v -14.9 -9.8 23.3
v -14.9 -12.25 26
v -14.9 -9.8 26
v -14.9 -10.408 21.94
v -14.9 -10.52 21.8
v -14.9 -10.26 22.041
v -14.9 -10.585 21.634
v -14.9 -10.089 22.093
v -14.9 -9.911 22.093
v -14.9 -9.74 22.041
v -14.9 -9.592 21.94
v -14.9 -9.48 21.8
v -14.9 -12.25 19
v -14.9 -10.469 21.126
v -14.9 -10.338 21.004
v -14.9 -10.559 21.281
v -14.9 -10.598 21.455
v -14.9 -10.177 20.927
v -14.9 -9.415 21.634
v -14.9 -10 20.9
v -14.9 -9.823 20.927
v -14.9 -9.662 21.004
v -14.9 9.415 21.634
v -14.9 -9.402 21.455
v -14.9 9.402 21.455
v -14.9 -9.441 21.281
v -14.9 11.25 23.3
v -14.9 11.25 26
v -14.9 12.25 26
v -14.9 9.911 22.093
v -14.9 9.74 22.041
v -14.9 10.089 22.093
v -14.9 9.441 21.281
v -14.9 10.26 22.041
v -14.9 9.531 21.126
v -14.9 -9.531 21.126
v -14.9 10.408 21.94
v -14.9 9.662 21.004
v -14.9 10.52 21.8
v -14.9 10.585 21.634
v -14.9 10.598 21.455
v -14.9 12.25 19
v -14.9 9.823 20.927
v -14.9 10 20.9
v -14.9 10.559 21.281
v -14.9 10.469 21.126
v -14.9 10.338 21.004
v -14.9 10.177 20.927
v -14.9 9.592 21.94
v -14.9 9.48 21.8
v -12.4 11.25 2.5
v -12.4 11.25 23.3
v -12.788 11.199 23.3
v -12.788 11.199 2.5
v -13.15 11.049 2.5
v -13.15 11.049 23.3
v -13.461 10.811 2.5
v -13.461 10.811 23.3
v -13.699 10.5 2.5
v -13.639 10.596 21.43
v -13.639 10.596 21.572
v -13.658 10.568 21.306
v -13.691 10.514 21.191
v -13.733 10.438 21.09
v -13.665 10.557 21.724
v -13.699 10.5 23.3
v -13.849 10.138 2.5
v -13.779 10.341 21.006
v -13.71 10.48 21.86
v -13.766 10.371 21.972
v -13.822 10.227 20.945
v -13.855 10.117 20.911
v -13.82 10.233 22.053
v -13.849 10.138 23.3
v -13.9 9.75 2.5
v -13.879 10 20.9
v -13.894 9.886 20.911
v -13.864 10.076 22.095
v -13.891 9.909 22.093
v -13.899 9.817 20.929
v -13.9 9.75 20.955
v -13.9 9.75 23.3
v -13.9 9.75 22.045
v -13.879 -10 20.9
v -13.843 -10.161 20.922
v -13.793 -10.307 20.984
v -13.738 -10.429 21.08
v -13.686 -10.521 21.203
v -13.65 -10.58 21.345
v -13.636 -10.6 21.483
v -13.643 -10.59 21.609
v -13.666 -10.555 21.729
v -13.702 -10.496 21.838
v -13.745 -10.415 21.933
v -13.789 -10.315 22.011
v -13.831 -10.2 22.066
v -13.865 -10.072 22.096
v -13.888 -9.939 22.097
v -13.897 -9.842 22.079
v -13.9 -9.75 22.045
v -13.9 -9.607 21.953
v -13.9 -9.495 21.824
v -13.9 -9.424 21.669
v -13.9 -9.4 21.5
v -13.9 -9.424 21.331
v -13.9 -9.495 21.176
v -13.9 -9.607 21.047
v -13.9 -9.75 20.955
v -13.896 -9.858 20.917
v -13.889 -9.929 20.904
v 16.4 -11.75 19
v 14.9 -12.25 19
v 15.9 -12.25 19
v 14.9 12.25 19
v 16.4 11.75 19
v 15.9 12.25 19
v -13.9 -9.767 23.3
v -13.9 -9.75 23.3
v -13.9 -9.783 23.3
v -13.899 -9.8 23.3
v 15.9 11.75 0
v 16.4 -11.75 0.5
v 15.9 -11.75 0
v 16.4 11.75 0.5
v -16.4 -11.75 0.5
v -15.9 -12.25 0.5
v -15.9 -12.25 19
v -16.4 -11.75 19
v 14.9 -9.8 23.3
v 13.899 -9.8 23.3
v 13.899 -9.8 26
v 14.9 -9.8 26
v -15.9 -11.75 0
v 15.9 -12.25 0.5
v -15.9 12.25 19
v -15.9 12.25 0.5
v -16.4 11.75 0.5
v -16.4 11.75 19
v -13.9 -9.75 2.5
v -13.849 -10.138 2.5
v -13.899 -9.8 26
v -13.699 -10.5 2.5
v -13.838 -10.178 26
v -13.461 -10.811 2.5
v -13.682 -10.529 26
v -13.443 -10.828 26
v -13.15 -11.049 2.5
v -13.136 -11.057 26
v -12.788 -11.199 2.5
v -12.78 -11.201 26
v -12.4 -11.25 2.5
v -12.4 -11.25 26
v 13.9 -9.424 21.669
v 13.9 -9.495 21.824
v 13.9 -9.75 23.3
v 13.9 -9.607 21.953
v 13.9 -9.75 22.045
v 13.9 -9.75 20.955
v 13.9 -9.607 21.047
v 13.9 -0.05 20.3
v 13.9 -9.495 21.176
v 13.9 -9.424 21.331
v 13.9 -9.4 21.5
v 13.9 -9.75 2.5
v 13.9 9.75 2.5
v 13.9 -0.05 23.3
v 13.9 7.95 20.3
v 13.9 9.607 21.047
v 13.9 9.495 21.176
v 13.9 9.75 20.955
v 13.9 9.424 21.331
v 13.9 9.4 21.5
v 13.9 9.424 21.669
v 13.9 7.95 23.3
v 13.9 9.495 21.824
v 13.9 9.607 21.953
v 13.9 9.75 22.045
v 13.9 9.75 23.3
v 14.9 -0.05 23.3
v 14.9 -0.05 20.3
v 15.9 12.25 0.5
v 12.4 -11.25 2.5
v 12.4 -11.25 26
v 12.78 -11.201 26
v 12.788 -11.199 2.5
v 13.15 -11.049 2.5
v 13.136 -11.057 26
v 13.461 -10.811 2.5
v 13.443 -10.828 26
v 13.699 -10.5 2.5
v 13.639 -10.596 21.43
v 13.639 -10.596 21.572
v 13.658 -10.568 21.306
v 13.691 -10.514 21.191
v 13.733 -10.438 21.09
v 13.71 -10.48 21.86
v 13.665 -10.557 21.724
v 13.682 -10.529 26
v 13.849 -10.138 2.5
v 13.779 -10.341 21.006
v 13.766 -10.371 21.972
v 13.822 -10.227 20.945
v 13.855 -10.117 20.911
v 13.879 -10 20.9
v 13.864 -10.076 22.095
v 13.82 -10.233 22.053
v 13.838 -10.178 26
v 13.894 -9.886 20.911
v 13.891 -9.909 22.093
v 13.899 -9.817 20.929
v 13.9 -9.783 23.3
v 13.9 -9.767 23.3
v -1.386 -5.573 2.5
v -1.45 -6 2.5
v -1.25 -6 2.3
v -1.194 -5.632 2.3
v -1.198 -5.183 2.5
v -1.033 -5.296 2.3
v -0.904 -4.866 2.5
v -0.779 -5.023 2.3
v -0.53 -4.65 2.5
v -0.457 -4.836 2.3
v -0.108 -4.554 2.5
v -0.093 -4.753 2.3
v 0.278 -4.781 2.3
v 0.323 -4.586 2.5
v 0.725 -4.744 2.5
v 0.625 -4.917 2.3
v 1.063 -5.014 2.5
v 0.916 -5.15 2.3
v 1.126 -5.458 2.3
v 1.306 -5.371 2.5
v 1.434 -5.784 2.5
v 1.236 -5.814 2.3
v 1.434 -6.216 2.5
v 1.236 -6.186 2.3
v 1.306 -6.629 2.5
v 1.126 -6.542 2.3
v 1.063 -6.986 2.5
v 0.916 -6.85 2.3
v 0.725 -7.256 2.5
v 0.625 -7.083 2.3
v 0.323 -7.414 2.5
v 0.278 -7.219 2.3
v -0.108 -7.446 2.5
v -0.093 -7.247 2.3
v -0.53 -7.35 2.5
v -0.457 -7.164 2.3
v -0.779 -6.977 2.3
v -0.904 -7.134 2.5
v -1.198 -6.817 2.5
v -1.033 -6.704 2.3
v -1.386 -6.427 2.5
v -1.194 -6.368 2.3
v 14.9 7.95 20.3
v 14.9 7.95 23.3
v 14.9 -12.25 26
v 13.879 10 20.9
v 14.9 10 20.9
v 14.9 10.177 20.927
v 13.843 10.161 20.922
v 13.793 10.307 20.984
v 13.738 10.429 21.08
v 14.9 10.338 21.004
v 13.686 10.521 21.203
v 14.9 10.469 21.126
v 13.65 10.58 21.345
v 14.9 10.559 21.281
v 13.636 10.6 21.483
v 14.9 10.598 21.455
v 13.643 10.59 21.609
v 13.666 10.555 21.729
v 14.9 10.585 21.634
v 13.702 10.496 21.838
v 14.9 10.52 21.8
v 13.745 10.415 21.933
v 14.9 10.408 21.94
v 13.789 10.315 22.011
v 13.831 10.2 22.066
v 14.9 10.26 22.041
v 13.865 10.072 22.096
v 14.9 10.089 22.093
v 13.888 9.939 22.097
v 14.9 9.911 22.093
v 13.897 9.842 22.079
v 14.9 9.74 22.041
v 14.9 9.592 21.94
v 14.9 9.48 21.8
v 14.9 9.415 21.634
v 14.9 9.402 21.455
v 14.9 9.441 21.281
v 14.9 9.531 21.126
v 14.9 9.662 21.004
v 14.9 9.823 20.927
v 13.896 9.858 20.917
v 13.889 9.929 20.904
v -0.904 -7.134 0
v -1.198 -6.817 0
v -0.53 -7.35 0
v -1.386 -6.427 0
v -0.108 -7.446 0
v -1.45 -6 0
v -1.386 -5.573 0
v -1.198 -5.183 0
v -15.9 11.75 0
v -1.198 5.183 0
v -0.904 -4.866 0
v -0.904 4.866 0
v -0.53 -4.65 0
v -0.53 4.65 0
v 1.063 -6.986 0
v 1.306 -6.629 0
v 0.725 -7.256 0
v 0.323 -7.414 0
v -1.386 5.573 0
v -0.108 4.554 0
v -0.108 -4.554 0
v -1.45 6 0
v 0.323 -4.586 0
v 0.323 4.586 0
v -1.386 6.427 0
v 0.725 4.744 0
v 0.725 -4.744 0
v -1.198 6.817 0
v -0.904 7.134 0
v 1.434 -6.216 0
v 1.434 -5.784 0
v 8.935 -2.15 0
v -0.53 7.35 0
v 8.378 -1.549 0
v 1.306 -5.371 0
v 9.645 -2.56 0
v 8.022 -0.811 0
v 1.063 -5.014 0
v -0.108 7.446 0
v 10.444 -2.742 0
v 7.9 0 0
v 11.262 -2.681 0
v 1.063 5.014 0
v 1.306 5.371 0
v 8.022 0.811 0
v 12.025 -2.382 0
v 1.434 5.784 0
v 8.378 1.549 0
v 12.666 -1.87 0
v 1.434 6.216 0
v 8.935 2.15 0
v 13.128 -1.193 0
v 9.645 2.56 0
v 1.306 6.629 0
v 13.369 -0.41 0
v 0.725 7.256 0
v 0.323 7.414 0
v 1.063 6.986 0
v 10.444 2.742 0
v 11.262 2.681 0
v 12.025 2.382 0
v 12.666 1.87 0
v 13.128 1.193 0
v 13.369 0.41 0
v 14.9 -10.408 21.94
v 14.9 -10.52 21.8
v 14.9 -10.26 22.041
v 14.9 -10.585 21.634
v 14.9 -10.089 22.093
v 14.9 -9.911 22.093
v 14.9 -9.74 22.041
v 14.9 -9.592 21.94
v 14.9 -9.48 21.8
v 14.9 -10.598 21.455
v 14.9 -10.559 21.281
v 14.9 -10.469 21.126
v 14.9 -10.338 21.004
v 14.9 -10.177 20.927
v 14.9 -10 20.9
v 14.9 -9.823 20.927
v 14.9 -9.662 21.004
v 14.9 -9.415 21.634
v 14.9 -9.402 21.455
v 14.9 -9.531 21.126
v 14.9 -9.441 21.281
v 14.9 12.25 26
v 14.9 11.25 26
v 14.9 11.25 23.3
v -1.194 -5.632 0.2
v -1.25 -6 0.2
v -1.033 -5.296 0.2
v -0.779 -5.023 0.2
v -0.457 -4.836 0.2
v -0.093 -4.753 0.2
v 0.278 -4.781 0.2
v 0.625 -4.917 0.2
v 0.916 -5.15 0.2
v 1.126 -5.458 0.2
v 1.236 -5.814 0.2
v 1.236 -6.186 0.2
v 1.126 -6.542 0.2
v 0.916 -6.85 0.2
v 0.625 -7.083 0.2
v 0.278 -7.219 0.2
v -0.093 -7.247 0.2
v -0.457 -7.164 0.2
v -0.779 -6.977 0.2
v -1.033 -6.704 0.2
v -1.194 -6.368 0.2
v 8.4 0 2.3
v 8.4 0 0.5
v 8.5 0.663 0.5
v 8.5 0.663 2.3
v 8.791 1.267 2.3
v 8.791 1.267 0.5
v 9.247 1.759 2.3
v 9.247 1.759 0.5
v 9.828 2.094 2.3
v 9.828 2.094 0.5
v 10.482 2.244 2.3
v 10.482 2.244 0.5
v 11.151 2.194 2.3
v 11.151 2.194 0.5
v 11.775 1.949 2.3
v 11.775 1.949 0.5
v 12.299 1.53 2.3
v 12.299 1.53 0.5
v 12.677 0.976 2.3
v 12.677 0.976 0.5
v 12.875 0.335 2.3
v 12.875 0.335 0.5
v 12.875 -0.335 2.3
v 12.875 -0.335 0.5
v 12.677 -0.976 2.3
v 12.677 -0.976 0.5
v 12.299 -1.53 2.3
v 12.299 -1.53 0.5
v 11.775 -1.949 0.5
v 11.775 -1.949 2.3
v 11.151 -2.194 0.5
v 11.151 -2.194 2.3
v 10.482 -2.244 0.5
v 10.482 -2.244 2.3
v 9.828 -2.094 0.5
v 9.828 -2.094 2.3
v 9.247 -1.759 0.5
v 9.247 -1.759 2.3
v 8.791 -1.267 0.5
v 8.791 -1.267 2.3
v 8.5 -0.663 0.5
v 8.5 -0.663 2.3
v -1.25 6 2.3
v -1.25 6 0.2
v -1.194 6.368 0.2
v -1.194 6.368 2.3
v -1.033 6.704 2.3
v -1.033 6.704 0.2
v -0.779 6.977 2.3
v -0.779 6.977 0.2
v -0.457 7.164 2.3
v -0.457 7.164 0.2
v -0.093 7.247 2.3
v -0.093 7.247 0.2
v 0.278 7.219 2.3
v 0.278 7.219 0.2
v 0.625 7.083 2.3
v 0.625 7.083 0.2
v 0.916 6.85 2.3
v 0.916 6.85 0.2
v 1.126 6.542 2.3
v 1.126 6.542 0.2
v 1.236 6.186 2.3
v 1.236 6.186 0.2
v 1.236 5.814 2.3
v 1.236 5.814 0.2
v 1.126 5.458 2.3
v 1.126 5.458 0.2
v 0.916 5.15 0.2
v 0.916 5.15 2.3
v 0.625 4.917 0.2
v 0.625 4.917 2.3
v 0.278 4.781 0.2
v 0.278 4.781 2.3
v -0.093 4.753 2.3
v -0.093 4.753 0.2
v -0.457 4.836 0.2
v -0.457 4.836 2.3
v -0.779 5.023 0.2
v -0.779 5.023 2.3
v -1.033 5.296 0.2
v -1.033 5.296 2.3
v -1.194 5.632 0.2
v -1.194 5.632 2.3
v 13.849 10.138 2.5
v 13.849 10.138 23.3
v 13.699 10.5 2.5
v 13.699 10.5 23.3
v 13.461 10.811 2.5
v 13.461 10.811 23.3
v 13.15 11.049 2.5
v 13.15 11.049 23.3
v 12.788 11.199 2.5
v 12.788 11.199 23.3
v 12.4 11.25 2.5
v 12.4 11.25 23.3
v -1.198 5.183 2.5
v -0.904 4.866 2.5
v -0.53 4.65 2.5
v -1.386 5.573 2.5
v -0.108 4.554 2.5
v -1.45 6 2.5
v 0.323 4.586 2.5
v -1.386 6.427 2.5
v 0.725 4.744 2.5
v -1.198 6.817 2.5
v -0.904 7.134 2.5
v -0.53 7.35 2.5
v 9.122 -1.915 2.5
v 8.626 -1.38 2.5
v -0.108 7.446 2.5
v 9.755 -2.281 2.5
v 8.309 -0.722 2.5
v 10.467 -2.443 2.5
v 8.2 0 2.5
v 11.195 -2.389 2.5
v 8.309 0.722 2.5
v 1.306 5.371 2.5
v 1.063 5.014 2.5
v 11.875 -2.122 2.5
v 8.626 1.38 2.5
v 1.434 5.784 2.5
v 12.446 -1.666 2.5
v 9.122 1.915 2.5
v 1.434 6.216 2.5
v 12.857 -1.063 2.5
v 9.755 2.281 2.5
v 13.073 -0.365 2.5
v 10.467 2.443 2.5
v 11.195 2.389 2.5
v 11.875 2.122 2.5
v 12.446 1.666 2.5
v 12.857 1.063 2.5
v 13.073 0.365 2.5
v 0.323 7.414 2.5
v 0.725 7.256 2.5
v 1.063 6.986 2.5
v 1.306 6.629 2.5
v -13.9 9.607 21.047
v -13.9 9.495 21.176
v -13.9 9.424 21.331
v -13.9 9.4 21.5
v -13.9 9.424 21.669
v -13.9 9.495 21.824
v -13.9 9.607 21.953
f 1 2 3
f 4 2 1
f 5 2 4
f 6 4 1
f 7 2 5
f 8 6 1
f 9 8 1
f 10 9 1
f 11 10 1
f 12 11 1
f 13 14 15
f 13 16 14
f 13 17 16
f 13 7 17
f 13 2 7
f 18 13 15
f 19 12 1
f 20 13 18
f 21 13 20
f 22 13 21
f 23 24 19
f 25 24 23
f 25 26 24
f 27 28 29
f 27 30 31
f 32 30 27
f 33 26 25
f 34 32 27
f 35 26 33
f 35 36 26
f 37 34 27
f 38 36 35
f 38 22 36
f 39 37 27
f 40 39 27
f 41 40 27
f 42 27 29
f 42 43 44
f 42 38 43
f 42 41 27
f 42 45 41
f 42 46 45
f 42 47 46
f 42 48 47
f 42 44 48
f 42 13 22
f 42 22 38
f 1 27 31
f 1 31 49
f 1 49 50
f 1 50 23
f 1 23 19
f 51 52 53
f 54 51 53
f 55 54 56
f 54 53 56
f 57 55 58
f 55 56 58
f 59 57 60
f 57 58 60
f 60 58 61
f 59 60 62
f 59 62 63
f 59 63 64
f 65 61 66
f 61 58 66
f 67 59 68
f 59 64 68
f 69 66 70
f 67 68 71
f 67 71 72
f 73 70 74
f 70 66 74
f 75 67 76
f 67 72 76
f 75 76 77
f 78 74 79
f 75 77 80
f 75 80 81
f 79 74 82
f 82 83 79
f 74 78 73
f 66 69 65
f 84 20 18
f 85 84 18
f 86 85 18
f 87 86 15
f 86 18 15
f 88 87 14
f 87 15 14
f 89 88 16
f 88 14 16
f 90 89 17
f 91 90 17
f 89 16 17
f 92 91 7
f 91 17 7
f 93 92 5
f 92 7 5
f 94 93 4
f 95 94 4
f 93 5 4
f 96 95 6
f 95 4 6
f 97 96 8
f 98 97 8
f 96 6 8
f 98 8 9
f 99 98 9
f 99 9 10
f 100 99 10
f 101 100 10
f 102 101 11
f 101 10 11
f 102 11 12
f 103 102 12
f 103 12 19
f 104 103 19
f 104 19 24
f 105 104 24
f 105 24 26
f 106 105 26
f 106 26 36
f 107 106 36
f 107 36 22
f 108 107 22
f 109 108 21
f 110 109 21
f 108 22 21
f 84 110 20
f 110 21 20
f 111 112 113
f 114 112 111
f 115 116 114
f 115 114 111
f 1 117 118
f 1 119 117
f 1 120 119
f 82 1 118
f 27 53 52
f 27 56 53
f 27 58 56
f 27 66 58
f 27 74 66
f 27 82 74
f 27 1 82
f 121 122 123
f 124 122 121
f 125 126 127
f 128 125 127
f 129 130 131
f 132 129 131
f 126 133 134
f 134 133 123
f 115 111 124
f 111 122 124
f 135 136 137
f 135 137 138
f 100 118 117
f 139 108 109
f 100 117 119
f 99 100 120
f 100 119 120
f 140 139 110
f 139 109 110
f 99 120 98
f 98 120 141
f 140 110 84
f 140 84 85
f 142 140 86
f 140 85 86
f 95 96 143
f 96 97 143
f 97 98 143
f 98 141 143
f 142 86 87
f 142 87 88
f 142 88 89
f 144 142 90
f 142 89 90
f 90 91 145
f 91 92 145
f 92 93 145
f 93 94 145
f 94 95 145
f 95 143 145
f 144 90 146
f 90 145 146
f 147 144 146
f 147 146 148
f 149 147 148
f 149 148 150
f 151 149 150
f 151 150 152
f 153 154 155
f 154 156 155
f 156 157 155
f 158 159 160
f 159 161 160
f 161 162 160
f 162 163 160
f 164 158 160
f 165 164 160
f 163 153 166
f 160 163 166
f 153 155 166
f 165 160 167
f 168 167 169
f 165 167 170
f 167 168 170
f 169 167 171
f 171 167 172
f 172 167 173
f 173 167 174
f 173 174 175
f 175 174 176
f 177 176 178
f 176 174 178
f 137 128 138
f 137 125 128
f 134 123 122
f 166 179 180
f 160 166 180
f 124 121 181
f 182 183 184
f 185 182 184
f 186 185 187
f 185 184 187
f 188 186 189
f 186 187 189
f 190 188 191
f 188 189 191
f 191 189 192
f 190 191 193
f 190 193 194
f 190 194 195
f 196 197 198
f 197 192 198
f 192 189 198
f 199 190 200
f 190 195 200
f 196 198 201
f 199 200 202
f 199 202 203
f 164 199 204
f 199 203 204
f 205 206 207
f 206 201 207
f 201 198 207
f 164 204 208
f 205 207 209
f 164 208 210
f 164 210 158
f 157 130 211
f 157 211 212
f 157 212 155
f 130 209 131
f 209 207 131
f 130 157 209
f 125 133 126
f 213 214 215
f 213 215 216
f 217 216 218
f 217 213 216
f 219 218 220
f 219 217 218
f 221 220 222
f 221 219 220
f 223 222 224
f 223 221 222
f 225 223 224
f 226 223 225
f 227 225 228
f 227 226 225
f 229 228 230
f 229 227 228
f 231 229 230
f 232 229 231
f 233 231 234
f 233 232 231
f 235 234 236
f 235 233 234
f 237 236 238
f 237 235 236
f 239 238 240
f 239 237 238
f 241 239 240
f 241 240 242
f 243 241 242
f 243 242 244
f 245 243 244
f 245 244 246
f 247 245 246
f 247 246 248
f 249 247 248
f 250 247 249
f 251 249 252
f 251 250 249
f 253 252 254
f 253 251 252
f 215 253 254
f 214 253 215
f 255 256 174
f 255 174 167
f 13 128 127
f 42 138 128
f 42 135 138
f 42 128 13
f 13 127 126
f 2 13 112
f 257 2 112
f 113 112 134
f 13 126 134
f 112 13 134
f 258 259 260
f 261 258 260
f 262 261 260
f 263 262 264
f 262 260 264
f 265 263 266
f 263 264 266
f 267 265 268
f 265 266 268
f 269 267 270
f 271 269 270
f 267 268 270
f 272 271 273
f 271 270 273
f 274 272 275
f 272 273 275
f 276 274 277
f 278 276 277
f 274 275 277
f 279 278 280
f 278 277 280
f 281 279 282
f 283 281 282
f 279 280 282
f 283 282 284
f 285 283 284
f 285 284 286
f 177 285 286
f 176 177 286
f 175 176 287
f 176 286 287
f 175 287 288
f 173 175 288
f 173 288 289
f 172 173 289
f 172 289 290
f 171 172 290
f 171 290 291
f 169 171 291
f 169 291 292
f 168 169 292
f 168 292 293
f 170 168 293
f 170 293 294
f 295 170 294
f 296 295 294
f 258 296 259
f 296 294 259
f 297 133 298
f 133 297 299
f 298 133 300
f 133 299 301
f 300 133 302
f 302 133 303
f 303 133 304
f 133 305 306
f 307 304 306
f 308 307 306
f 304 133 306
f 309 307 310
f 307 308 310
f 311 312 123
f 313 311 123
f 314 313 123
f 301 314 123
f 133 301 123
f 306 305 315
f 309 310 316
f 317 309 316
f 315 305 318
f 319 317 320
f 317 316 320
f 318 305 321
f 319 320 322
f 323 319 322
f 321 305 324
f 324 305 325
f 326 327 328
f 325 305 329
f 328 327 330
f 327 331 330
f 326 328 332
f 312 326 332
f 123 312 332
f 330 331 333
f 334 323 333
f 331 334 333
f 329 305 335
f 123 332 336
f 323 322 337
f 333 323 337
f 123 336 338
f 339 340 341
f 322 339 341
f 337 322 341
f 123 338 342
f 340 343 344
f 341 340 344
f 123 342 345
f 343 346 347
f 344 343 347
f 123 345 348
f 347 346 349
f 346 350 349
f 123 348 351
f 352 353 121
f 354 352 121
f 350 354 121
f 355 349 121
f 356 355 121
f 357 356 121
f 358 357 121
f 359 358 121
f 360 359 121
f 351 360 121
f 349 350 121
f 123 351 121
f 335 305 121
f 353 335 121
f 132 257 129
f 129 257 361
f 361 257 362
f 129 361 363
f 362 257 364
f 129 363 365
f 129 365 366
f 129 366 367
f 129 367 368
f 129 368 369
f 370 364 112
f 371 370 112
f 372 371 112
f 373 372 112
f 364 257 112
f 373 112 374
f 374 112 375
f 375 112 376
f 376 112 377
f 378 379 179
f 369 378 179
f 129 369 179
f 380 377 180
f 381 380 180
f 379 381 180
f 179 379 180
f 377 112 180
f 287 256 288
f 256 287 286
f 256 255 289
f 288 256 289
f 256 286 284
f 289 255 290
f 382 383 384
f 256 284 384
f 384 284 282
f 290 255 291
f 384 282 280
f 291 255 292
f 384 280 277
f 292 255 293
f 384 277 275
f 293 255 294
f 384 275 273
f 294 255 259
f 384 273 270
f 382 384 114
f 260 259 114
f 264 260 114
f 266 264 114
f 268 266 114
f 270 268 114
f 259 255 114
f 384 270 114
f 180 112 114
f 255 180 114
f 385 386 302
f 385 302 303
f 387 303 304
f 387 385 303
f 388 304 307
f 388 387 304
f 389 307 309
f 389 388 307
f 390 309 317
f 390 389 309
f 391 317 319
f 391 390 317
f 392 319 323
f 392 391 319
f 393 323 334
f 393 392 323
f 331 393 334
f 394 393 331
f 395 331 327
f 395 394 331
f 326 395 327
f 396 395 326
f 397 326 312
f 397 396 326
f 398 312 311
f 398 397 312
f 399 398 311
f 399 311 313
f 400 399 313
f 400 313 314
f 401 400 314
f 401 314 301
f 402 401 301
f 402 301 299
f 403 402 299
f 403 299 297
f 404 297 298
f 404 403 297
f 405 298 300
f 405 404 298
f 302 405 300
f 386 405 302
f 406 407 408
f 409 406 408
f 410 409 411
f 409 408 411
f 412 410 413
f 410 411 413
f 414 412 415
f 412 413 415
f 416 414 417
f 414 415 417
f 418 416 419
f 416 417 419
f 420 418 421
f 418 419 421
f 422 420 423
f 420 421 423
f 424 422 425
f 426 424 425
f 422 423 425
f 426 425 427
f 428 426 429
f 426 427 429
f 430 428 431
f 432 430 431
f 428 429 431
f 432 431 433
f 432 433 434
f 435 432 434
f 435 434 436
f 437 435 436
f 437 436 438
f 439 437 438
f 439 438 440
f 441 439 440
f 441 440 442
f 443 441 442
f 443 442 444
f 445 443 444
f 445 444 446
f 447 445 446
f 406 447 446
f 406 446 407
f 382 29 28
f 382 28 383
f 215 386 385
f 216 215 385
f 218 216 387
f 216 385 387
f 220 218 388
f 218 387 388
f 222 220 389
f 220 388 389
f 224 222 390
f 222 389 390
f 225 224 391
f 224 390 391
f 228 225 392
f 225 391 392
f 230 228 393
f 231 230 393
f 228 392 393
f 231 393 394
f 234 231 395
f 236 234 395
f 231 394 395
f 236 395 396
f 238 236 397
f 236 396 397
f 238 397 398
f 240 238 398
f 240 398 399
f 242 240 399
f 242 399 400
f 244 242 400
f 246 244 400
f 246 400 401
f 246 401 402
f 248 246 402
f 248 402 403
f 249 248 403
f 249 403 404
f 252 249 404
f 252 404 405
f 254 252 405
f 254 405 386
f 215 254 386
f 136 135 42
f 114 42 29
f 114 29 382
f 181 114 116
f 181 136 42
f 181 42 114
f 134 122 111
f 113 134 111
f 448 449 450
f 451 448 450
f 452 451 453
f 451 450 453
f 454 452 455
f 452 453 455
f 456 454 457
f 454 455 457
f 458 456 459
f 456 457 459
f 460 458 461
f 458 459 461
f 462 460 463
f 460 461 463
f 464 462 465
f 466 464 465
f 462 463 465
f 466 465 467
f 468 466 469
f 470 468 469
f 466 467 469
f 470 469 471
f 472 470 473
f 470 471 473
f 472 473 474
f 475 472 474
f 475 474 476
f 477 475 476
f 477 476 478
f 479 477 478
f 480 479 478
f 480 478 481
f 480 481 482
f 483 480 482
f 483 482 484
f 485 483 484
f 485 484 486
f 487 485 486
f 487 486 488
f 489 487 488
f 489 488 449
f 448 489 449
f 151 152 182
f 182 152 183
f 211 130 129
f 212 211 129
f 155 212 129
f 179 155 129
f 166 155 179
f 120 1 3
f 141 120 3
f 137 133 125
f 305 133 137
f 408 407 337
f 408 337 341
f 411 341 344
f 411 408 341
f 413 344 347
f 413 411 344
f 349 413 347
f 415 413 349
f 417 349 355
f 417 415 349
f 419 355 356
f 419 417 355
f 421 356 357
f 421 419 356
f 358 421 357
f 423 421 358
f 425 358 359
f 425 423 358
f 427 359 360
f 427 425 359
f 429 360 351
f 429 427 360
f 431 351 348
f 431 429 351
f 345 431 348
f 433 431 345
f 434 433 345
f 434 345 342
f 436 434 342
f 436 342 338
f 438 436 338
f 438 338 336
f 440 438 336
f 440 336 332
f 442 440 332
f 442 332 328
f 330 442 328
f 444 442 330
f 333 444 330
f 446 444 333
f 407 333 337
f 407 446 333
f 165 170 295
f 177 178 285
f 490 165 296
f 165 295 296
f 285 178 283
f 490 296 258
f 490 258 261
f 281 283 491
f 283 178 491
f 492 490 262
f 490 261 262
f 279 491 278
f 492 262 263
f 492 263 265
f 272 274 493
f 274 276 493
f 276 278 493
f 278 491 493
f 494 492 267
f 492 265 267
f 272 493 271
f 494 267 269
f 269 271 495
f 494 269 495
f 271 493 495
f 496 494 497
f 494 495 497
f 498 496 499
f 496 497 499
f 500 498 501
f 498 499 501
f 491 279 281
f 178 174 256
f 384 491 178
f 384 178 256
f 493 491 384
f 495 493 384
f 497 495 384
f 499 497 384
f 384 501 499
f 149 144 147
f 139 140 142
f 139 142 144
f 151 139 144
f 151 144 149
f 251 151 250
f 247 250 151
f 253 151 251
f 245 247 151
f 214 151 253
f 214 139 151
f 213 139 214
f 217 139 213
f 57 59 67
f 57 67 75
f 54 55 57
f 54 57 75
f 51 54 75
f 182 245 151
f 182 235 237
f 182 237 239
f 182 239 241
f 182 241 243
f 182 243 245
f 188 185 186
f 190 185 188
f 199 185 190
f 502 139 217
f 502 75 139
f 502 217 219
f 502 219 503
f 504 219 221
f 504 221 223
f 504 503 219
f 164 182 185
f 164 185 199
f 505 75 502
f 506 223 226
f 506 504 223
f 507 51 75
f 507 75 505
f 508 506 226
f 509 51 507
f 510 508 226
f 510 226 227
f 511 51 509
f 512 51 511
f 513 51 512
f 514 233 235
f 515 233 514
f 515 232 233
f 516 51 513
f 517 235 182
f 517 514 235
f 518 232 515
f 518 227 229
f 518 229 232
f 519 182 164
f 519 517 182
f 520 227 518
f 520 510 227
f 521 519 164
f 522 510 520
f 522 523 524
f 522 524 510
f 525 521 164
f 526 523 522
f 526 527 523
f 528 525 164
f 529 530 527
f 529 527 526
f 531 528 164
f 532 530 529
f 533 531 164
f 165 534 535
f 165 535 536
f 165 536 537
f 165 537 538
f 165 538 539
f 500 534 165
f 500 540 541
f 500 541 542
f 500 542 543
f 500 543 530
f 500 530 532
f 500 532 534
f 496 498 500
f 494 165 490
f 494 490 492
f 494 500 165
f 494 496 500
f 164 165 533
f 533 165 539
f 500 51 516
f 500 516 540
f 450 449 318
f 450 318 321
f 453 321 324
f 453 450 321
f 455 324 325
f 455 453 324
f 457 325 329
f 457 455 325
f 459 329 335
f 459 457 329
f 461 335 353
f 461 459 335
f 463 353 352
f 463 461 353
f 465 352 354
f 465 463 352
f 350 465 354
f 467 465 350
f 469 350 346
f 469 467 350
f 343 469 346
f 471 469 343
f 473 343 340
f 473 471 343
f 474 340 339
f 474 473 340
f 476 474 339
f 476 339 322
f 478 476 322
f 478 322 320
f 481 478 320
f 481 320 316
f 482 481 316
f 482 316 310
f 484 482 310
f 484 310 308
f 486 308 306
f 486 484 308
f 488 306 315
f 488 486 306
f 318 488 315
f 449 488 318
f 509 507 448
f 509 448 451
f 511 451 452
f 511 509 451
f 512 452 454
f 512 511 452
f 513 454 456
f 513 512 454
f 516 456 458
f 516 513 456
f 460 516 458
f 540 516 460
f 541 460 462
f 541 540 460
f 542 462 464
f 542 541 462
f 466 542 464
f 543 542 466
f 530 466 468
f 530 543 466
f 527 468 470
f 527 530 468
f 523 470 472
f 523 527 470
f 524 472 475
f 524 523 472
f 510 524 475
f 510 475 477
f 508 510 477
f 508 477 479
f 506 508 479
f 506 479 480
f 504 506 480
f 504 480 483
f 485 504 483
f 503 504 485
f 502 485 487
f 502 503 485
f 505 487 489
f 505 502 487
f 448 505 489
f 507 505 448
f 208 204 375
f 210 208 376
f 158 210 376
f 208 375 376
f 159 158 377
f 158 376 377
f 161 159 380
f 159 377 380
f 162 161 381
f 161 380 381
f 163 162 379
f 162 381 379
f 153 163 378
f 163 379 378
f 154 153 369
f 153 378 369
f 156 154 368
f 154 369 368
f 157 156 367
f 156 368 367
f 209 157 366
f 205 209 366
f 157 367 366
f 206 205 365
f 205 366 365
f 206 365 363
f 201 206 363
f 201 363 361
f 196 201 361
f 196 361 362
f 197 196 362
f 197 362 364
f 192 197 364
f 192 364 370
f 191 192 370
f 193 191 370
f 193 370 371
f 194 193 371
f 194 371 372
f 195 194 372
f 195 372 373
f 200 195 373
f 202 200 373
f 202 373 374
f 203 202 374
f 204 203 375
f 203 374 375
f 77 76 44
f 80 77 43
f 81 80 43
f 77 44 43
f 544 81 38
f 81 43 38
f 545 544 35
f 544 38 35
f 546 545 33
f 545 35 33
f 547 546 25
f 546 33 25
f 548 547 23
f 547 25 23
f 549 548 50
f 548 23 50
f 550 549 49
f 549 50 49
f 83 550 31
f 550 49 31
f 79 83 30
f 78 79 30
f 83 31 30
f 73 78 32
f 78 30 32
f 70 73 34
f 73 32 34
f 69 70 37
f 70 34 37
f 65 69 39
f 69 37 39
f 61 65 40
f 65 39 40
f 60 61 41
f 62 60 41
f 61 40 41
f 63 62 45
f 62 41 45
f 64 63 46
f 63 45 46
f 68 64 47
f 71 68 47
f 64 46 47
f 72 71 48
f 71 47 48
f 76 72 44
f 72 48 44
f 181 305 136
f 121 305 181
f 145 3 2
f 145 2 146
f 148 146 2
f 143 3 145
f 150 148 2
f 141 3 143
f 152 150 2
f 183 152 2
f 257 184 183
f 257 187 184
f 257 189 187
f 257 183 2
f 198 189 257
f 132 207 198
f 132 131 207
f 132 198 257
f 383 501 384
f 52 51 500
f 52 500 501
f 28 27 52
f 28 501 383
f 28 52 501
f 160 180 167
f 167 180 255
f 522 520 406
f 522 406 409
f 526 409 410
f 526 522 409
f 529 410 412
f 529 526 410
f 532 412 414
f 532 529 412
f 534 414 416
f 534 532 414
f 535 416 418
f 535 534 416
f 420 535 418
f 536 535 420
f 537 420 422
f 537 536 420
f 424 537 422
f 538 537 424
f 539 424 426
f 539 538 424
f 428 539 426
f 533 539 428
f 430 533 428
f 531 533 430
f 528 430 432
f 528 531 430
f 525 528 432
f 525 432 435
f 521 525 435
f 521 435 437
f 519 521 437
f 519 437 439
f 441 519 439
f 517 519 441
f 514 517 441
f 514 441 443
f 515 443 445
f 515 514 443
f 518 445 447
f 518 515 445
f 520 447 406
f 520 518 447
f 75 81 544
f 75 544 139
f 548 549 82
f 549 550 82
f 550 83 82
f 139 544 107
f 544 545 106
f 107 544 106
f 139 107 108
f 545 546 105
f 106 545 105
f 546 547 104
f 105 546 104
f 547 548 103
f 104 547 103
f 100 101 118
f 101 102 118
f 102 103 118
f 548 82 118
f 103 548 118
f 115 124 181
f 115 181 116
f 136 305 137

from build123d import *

# Parameters (mm, degrees)
SKETCH7_W           = 32.8
SKETCH7_H           = 24.5
BOSS_EXTRUDE3_DEPTH = 19
SKETCH8_W           = 29.8
SKETCH8_H           = 24.5
BOSS_EXTRUDE4_DEPTH = 7
CUT_EXTRUDE1_DEPTH  = 23.5
CUT_EXTRUDE2_REACH  = 44.494
SKETCH10_W          = 2.7
SKETCH10_H          = 21.05
SKETCH18_W          = 3
SKETCH18_H          = 8
CUT_EXTRUDE3_DEPTH  = 1
CHAMFER1_SIZE       = 0.5
CUT_EXTRUDE5_REACH  = 44.494
SKETCH20_R          = 0.6
CUT_EXTRUDE6_REACH  = 44.494
SKETCH19_R          = 0.6
CUT_EXTRUDE7_REACH  = 35.091
SKETCH21_R          = 2.25
SKETCH21_R_2        = 1.25
CHAMFER2_SIZE       = 0.5
CHAMFER4_SIZE       = 0.2


with BuildPart() as part:
    # Sketch7 → Boss-Extrude3 (new body)
    with BuildSketch(Plane.XY):
        Rectangle(SKETCH7_W, SKETCH7_H)
    extrude(amount=BOSS_EXTRUDE3_DEPTH)

    # Sketch8 → Boss-Extrude4 (add)
    with BuildSketch(Plane.XY.offset(19)):
        Rectangle(SKETCH8_W, SKETCH8_H)
    extrude(amount=BOSS_EXTRUDE4_DEPTH)

    # Sketch16 → Cut-Extrude1 (cut)
    with BuildSketch(Plane.XY.offset(26)):
        with BuildLine():
            Line((-12.4, -11.25), (12.4, -11.25))
            ThreePointArc((12.4, -11.25), (13.460660172, -10.810660172), (13.9, -9.75))
            Line((13.9, -9.75), (13.9, 9.75))
            ThreePointArc((13.9, 9.75), (13.460660172, 10.810660172), (12.4, 11.25))
            Line((12.4, 11.25), (-12.4, 11.25))
            ThreePointArc((-12.4, 11.25), (-13.460660172, 10.810660172), (-13.9, 9.75))
            Line((-13.9, 9.75), (-13.9, -9.75))
            ThreePointArc((-13.9, -9.75), (-13.460660172, -10.810660172), (-12.4, -11.25))
        make_face()
    extrude(amount=-CUT_EXTRUDE1_DEPTH, mode=Mode.SUBTRACT)

    # Cut-Extrude2: up to this face of the body (flat: up to its plane)
    cut_extrude2_end = Plane(part.part.faces().sort_by_distance((14.9, 0, 22.5))[0])
    # Sketch10 → Cut-Extrude2 (cut, up to the picked face)
    with BuildSketch(Plane.ZY.offset(14.9), mode=Mode.PRIVATE) as cut_extrude2_sk1:
        with Locations((24.65, 0.725)):
            Rectangle(SKETCH10_W, SKETCH10_H)
    cut_extrude2_tool1 = split(extrude(cut_extrude2_sk1.sketch, amount=-CUT_EXTRUDE2_REACH, mode=Mode.PRIVATE), bisect_by=cut_extrude2_end, keep=Keep.BOTH, mode=Mode.PRIVATE)
    add(cut_extrude2_tool1.solids().sort_by(Axis((-14.9, 0.725, 24.65), (1, 0, 0)))[0], mode=Mode.SUBTRACT)

    # Sketch18 → Cut-Extrude3 (cut)
    with BuildSketch(Plane(origin=(14.9, 0, 0), x_dir=(0, 0, -1), z_dir=(1, 0, 0))):
        with Locations((-21.8, 3.95)):
            Rectangle(SKETCH18_W, SKETCH18_H)
    extrude(amount=-CUT_EXTRUDE3_DEPTH, mode=Mode.SUBTRACT)

    # Chamfer1
    chamfer1_edges = [part.edges().sort_by_distance(p)[0] for p in [
        (0, -12.25, 0),
        (-16.4, 0, 0),
        (0, 12.25, 0),
        (16.4, 0, 0),
        (16.4, -12.25, 9.5),
        (-16.4, -12.25, 9.5),
        (-16.4, 12.25, 9.5),
        (16.4, 12.25, 9.5),
    ]]
    chamfer(chamfer1_edges, length=CHAMFER1_SIZE)

    # Sketch20 → Cut-Extrude5 (cut, up to next)
    with BuildSketch(Plane(origin=(14.9, 0, 0), x_dir=(0, 0, -1), z_dir=(1, 0, 0)), mode=Mode.PRIVATE) as cut_extrude5_sk1:
        with Locations((-21.5, 10)):
            Circle(SKETCH20_R)
    cut_extrude5_tool1 = extrude(cut_extrude5_sk1.sketch, amount=-CUT_EXTRUDE5_REACH, mode=Mode.PRIVATE) & part.part
    # Sketch20 → Cut-Extrude5 (cut, up to next)
    with BuildSketch(Plane(origin=(14.9, 0, 0), x_dir=(0, 0, -1), z_dir=(1, 0, 0)), mode=Mode.PRIVATE) as cut_extrude5_sk2:
        with Locations((-21.5, -10)):
            Circle(SKETCH20_R)
    cut_extrude5_tool2 = extrude(cut_extrude5_sk2.sketch, amount=-CUT_EXTRUDE5_REACH, mode=Mode.PRIVATE) & part.part
    add(cut_extrude5_tool1.solids().sort_by_distance((14.9, 10, 21.5))[0], mode=Mode.SUBTRACT)
    add(cut_extrude5_tool2.solids().sort_by_distance((14.9, -10, 21.5))[0], mode=Mode.SUBTRACT)

    # Sketch19 → Cut-Extrude6 (cut, up to next)
    with BuildSketch(Plane.ZY.offset(14.9), mode=Mode.PRIVATE) as cut_extrude6_sk1:
        with Locations(Location((21.5, 10, 0), (0, 0, 180))):
            Circle(SKETCH19_R)
    cut_extrude6_tool1 = extrude(cut_extrude6_sk1.sketch, amount=-CUT_EXTRUDE6_REACH, mode=Mode.PRIVATE) & part.part
    # Sketch19 → Cut-Extrude6 (cut, up to next)
    with BuildSketch(Plane.ZY.offset(14.9), mode=Mode.PRIVATE) as cut_extrude6_sk2:
        with Locations(Location((21.5, -10, 0), (0, 0, 180))):
            Circle(SKETCH19_R)
    cut_extrude6_tool2 = extrude(cut_extrude6_sk2.sketch, amount=-CUT_EXTRUDE6_REACH, mode=Mode.PRIVATE) & part.part
    add(cut_extrude6_tool1.solids().sort_by_distance((-14.9, 10, 21.5))[0], mode=Mode.SUBTRACT)
    add(cut_extrude6_tool2.solids().sort_by_distance((-14.9, -10, 21.5))[0], mode=Mode.SUBTRACT)

    # Sketch21 → Cut-Extrude7 (cut, up to next)
    with BuildSketch(Plane(origin=(0, 0, 0), x_dir=(-1, 0, 0), z_dir=(0, 0, -1)), mode=Mode.PRIVATE) as cut_extrude7_sk1:
        with Locations((-10.65, 0)):
            Circle(SKETCH21_R)
    cut_extrude7_tool1 = extrude(cut_extrude7_sk1.sketch, amount=-CUT_EXTRUDE7_REACH, mode=Mode.PRIVATE) & part.part
    # Sketch21 → Cut-Extrude7 (cut, up to next)
    with BuildSketch(Plane(origin=(0, 0, 0), x_dir=(-1, 0, 0), z_dir=(0, 0, -1)), mode=Mode.PRIVATE) as cut_extrude7_sk2:
        with Locations((0, 6)):
            Circle(SKETCH21_R_2)
    cut_extrude7_tool2 = extrude(cut_extrude7_sk2.sketch, amount=-CUT_EXTRUDE7_REACH, mode=Mode.PRIVATE) & part.part
    # Sketch21 → Cut-Extrude7 (cut, up to next)
    with BuildSketch(Plane(origin=(0, 0, 0), x_dir=(-1, 0, 0), z_dir=(0, 0, -1)), mode=Mode.PRIVATE) as cut_extrude7_sk3:
        with Locations((0, -6)):
            Circle(SKETCH21_R_2)
    cut_extrude7_tool3 = extrude(cut_extrude7_sk3.sketch, amount=-CUT_EXTRUDE7_REACH, mode=Mode.PRIVATE) & part.part
    add(cut_extrude7_tool1.solids().sort_by_distance((10.65, 0, 0))[0], mode=Mode.SUBTRACT)
    add(cut_extrude7_tool2.solids().sort_by_distance((0, 6, 0))[0], mode=Mode.SUBTRACT)
    add(cut_extrude7_tool3.solids().sort_by_distance((0, -6, 0))[0], mode=Mode.SUBTRACT)

    # Chamfer2
    chamfer2_edges = [part.edges().sort_by_distance(p)[0] for p in [
        (12.9, 0, 0),
    ]]
    chamfer(chamfer2_edges, length=CHAMFER2_SIZE)

    # Chamfer4
    chamfer4_edges = [part.edges().sort_by_distance(p)[0] for p in [
        (1.25, 6, 2.5),
        (1.25, 6, 0),
        (1.25, -6, 2.5),
        (1.25, -6, 0),
        (12.9, 0, 2.5),
    ]]
    chamfer(chamfer4_edges, length=CHAMFER4_SIZE)


solid = part.part
